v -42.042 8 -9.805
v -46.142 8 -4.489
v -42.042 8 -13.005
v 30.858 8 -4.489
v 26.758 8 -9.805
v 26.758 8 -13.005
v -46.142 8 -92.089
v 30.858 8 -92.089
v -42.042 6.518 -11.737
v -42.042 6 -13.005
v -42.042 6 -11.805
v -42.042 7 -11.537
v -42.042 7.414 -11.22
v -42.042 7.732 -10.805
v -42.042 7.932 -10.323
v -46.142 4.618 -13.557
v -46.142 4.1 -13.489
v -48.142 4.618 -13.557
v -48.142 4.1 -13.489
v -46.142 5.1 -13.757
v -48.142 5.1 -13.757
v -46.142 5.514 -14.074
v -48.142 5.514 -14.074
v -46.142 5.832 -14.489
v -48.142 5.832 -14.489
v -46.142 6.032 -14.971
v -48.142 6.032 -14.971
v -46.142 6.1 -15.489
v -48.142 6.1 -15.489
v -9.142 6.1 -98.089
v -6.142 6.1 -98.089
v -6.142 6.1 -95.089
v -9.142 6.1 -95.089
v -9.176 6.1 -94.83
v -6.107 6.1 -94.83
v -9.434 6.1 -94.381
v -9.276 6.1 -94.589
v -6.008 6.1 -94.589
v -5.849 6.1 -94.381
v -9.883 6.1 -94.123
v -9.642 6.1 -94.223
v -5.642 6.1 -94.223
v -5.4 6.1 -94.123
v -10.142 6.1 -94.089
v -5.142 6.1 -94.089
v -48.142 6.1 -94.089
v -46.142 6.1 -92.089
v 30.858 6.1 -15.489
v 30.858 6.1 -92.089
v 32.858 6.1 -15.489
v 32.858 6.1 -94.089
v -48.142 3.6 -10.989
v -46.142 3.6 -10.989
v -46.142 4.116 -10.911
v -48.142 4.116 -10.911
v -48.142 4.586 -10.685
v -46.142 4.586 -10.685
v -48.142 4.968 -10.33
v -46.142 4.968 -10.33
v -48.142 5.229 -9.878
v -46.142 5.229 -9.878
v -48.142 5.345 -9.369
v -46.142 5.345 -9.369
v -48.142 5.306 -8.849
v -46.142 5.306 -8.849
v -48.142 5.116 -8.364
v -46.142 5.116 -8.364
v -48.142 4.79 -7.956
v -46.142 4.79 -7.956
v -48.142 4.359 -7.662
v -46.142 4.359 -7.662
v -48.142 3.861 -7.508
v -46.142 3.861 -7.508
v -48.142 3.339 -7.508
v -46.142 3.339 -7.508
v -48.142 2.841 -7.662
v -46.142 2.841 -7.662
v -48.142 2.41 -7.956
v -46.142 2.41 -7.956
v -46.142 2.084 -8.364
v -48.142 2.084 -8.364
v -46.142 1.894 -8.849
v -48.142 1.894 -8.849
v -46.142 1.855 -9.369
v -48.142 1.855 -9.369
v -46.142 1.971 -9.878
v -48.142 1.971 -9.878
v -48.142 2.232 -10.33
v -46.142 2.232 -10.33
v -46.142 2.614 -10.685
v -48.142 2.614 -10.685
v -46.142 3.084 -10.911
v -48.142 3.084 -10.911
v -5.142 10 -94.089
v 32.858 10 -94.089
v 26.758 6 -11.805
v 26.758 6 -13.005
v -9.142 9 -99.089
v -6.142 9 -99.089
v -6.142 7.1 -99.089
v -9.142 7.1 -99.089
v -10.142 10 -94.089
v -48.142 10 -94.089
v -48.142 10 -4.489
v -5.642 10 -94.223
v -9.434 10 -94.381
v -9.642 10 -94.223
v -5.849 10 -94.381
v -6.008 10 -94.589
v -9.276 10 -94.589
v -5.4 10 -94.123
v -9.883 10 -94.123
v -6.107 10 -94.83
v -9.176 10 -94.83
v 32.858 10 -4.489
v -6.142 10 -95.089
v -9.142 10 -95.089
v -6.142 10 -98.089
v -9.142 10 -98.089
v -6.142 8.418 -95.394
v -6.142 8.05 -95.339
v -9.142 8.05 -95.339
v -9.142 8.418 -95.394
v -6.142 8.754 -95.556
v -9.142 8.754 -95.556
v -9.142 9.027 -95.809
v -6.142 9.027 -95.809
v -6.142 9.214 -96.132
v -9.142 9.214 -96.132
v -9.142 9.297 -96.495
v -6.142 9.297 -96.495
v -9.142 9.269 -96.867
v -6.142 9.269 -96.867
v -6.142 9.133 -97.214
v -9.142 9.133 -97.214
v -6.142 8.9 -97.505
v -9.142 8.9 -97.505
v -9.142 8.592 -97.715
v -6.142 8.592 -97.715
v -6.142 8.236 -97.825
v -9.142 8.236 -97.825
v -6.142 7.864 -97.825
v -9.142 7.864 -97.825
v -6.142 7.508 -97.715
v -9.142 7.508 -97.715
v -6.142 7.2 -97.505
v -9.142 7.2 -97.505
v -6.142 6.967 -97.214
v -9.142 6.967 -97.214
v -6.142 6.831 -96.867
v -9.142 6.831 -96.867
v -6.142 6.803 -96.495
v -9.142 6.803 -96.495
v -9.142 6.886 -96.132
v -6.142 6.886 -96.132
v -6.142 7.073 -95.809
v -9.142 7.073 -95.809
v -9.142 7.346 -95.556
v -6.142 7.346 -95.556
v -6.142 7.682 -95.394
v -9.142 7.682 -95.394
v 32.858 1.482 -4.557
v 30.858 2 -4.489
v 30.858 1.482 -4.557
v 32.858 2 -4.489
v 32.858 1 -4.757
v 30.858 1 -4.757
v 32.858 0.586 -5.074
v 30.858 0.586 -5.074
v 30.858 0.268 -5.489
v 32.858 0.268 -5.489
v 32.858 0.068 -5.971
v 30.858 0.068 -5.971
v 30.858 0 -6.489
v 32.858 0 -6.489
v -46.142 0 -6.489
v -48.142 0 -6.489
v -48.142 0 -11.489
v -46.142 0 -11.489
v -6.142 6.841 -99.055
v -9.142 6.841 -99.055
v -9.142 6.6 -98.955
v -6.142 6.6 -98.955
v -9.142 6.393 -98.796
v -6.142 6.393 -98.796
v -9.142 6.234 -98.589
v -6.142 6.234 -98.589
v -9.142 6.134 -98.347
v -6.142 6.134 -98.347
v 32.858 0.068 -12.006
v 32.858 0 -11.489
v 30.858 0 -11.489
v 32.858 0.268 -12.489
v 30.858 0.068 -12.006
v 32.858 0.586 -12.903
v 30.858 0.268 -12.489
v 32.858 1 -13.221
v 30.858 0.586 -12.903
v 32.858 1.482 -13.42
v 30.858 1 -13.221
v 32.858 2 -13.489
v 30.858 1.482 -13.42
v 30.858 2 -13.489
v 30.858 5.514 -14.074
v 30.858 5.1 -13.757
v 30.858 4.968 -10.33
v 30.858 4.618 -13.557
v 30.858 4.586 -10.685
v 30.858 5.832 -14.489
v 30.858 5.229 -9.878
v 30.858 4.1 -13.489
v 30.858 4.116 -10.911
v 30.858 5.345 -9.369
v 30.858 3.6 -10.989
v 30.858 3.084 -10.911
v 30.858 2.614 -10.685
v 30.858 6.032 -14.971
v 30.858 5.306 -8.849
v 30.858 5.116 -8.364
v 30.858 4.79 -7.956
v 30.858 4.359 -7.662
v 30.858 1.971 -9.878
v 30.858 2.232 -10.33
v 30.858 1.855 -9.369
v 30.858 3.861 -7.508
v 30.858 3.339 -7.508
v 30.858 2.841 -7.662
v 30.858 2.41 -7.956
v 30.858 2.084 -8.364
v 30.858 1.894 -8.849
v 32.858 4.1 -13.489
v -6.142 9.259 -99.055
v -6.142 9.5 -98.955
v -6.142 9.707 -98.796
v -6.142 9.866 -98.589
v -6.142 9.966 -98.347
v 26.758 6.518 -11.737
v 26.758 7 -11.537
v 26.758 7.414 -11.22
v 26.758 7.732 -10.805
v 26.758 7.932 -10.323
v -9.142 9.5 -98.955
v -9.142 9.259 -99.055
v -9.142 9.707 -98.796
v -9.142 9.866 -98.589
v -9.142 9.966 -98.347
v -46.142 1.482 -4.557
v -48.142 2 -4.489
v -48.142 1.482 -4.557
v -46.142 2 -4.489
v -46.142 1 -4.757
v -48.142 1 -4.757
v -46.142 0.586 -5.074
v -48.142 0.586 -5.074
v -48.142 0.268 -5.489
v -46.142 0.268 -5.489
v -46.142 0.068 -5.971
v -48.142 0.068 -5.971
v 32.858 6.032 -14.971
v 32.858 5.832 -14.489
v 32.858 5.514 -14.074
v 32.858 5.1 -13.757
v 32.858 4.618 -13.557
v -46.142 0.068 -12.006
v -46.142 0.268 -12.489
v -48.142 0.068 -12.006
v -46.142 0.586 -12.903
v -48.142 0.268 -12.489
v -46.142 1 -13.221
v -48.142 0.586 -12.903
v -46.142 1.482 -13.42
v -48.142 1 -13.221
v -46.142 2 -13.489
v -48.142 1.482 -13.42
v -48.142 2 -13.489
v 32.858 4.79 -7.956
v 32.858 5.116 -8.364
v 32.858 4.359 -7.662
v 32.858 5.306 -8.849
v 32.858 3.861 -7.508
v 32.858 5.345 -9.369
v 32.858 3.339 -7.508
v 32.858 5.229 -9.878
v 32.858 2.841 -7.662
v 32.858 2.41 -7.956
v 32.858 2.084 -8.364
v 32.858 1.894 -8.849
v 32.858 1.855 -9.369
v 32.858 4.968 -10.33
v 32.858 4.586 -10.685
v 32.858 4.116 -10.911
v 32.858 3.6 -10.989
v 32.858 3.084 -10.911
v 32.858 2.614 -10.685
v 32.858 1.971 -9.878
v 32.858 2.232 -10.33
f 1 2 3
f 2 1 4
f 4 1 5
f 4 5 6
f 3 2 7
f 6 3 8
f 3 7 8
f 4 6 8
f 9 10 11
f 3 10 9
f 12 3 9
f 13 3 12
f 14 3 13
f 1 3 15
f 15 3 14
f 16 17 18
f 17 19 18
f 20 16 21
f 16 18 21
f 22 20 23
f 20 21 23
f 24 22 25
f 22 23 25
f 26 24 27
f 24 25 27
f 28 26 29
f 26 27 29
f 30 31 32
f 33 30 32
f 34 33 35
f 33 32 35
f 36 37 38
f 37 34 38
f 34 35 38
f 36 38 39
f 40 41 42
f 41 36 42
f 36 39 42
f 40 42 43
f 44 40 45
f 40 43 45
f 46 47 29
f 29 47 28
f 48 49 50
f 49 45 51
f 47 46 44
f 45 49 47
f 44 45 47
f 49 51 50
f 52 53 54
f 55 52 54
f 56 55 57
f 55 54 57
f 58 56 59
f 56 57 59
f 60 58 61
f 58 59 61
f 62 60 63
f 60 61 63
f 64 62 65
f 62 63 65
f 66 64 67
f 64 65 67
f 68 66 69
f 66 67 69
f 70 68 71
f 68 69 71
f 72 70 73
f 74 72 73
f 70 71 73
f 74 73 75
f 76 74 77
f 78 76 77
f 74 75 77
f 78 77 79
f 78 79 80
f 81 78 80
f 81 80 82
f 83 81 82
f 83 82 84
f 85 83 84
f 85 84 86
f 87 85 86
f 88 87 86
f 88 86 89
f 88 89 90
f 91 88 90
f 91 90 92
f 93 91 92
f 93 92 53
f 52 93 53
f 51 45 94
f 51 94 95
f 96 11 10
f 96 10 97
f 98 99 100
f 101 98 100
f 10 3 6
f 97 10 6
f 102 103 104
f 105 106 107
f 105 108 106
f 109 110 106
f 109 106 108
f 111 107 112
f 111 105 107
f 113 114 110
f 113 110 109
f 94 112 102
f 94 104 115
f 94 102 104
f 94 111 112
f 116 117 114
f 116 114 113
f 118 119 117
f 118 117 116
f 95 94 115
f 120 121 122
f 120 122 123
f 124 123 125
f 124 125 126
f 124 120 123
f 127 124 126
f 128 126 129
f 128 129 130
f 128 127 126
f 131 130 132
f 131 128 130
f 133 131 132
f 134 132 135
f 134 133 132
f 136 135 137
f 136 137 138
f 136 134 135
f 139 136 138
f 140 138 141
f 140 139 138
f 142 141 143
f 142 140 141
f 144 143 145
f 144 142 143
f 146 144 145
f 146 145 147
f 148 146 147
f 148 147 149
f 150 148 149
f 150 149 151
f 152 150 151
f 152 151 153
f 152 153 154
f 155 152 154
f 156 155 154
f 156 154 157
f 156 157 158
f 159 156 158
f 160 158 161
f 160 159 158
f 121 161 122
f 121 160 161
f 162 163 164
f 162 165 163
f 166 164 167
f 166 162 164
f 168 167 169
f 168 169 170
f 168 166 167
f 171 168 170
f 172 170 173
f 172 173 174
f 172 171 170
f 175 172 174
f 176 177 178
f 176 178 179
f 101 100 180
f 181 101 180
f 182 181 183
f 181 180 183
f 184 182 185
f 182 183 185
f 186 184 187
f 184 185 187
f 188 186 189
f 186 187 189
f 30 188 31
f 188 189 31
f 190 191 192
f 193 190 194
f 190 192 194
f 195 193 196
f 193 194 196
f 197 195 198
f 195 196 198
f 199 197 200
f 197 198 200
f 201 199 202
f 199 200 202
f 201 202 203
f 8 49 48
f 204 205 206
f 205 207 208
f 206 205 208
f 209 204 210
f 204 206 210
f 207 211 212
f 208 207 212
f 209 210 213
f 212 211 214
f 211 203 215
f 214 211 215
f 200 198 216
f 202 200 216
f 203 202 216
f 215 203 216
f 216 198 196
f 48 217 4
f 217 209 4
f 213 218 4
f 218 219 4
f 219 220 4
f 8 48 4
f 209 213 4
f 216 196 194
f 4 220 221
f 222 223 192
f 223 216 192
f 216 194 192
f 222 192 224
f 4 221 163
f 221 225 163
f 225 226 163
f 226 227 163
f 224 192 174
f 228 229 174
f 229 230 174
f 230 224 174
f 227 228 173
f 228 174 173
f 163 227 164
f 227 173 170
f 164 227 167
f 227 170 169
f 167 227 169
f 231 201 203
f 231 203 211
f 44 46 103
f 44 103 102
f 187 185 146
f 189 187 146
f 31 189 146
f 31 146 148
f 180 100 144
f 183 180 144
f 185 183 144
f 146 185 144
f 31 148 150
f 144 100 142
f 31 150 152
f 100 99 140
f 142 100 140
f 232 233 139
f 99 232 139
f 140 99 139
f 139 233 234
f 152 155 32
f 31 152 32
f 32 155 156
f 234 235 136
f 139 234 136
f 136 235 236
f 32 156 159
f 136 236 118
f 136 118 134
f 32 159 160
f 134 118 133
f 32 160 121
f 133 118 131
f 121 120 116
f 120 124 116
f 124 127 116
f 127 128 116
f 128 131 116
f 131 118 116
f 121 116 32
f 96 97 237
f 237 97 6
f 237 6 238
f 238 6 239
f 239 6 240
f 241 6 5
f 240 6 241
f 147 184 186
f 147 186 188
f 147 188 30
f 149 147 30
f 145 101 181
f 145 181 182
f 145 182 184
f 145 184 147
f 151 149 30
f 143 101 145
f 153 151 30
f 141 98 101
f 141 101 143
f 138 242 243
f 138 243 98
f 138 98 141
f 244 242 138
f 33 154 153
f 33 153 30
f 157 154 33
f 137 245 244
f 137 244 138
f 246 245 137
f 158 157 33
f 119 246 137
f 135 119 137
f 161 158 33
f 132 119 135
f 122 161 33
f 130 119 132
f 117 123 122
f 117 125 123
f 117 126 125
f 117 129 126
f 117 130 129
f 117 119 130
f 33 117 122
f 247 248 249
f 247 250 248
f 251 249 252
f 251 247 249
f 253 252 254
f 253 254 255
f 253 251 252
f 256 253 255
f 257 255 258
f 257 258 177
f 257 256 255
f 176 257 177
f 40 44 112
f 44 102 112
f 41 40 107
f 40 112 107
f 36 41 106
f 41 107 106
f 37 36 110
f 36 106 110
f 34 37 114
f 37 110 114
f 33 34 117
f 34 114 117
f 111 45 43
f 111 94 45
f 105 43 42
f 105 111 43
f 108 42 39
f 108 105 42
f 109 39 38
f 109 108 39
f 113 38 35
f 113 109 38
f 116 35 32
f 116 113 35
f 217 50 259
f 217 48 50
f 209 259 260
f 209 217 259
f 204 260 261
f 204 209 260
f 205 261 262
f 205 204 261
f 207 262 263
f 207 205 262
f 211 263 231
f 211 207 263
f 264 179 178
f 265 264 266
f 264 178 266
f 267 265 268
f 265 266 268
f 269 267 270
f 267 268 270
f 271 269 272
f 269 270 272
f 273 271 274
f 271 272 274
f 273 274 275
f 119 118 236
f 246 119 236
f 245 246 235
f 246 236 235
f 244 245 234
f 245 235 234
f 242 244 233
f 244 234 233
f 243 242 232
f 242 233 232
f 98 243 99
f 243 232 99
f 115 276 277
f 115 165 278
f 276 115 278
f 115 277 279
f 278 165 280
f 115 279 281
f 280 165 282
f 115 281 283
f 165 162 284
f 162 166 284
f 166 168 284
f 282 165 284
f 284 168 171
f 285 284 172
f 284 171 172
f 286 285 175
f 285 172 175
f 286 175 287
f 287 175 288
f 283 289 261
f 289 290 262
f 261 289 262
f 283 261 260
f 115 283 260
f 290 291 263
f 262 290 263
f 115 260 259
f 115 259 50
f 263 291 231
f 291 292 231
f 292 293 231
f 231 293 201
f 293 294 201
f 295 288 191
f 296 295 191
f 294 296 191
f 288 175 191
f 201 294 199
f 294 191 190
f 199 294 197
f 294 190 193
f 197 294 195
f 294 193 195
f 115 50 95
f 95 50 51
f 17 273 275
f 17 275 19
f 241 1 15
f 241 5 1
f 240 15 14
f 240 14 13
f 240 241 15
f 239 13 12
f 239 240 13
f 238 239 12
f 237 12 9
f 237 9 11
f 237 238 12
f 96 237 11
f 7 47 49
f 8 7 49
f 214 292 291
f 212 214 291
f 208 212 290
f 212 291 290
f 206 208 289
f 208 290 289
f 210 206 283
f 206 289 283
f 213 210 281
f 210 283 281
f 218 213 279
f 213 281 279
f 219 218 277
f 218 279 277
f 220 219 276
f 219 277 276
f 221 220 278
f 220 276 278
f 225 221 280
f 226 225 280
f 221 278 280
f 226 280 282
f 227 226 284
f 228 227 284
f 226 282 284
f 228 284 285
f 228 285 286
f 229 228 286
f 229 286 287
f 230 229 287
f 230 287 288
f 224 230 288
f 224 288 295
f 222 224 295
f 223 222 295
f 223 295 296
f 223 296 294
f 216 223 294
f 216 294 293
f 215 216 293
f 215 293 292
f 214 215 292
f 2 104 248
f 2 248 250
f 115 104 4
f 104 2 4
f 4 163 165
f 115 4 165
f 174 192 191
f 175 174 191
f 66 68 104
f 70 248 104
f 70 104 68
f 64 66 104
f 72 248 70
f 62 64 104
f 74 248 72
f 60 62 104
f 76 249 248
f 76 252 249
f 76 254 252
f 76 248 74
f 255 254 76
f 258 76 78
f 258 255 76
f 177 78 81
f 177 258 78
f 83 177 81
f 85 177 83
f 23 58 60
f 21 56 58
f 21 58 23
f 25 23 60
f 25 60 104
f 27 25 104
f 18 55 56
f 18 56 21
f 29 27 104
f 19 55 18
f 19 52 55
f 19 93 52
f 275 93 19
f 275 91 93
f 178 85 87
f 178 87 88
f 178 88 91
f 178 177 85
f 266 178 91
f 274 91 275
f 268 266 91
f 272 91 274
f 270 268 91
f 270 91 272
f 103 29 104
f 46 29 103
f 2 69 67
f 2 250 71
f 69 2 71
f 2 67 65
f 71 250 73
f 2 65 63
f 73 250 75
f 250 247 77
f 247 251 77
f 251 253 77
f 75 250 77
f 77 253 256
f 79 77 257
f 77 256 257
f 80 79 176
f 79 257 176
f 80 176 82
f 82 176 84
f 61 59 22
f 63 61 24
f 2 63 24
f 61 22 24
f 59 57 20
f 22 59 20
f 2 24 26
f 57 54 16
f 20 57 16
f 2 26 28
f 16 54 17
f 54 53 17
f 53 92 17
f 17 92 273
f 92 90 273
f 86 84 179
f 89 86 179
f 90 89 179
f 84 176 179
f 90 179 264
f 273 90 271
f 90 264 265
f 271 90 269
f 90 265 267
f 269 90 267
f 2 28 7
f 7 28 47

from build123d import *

# Parameters (mm, degrees)
BOSS_EXTRUDE2_DEPTH      = 8
SKETCH2_W                = 81
SKETCH2_H                = 89.6
BOSS_EXTRUDE3_DEPTH      = 2
SKETCH3_R                = 1.75
CUT_EXTRUDE1_DEPTH       = 125.5538661
CUT_EXTRUDE2_DEPTH       = 124.262587838
CUT_EXTRUDE2_DEPTH_BACK  = 124.262587838
SKETCH4_W                = 80.6
SKETCH4_H                = 6.1
SKETCH5_W                = 68.8
SKETCH5_H                = 1.2
BOSS_EXTRUDE4_DEPTH      = 2
FILLET2_R                = 2
BOSS_EXTRUDE5_DEPTH      = 1.5
BOSS_EXTRUDE5_DEPTH_BACK = 1.5
SKETCH7_R                = 1.25
FILLET5_R                = 1


with BuildPart() as part:
    # Sketch1 → Boss-Extrude2 (new body)
    with BuildSketch(Plane(origin=(0, 0, 0), x_dir=(1, 0, 0), z_dir=(0, 1, 0))):
        Polygon((-46.14154214, 4.488604838), (-46.14154214, 13.488604838), (-46.14154214, 92.088604838), (30.85845786, 92.088604838), (30.85845786, 13.488604838), (30.85845786, 4.488604838), (32.85845786, 4.488604838), (32.85845786, 94.088604838), (-48.14154214, 94.088604838), (-48.14154214, 4.488604838), align=None)
    extrude(amount=BOSS_EXTRUDE2_DEPTH)

    # Sketch2 → Boss-Extrude3 (add)
    with BuildSketch(Plane(origin=(0, 8, 0), x_dir=(1, 0, 0), z_dir=(0, 1, 0))):
        with Locations((-7.64154214, 49.288604838)):
            Rectangle(SKETCH2_W, SKETCH2_H)
    extrude(amount=BOSS_EXTRUDE3_DEPTH)

    # Sketch3 → Cut-Extrude1 (cut, through all)
    with BuildSketch(Plane(origin=(32.85845786, 0, 0), x_dir=(0, 0, -1), z_dir=(1, 0, 0))):
        with Locations((9.238604838, 3.6)):
            Circle(SKETCH3_R)
    extrude(amount=-CUT_EXTRUDE1_DEPTH, mode=Mode.SUBTRACT)

    # Sketch4 → Cut-Extrude2 (cut, two sides: drawn at the far end of the back side and taken through both)
    with BuildSketch(Plane.ZY.offset(-30.85845786).offset(-CUT_EXTRUDE2_DEPTH_BACK)):
        with Locations((-53.788604838, 3.05)):
            Rectangle(SKETCH4_W, SKETCH4_H)
    extrude(amount=CUT_EXTRUDE2_DEPTH + CUT_EXTRUDE2_DEPTH_BACK, mode=Mode.SUBTRACT)

    # Sketch5 → Boss-Extrude4 (add)
    with BuildSketch(Plane.XZ.offset(-8)):
        with Locations((-7.64154214, -12.405302831)):
            Rectangle(SKETCH5_W, SKETCH5_H)
    extrude(amount=BOSS_EXTRUDE4_DEPTH)

    # Fillet2
    fillet2_edges = [part.edges().sort_by_distance(p)[0] for p in [
        (-7.64154214, 8, -11.805302831),
        (-47.14154214, 0, -4.488604838),
        (-47.14154214, 0, -13.488604838),
        (-47.14154214, 6.1, -13.488604838),
        (31.85845786, 6.1, -13.488604838),
        (31.85845786, 0, -4.488604838),
        (31.85845786, 0, -13.488604838),
    ]]
    fillet(fillet2_edges, radius=FILLET2_R - 0.0001)  # a hair under: the kernel refuses the full size

    # Sketch7 → Boss-Extrude5 (add, two sides: drawn at the far end of the back side and taken through both)
    with BuildSketch(Plane.ZY.offset(7.64154214).offset(-BOSS_EXTRUDE5_DEPTH_BACK)):
        with BuildLine():
            Line((-94.088604838, 10), (-98.088604838, 10))
            ThreePointArc((-98.088604838, 10), (-98.79571162, 9.707106781), (-99.088604838, 9))
            Line((-99.088604838, 9), (-99.088604838, 7.1))
            ThreePointArc((-99.088604838, 7.1), (-98.79571162, 6.392893219), (-98.088604838, 6.1))
            Line((-98.088604838, 6.1), (-94.088604838, 6.1))
            Line((-94.088604838, 6.1), (-94.088604838, 10))
        make_face()
        with Locations((-96.588604838, 8.05)):
            Circle(SKETCH7_R, mode=Mode.SUBTRACT)
    extrude(amount=BOSS_EXTRUDE5_DEPTH + BOSS_EXTRUDE5_DEPTH_BACK)

    # Fillet5
    fillet5_edges = [part.edges().sort_by_distance(p)[0] for p in [
        (-6.14154214, 8.05, -94.088604838),
        (-9.14154214, 8.05, -94.088604838),
    ]]
    fillet(fillet5_edges, radius=FILLET5_R)


solid = part.part
